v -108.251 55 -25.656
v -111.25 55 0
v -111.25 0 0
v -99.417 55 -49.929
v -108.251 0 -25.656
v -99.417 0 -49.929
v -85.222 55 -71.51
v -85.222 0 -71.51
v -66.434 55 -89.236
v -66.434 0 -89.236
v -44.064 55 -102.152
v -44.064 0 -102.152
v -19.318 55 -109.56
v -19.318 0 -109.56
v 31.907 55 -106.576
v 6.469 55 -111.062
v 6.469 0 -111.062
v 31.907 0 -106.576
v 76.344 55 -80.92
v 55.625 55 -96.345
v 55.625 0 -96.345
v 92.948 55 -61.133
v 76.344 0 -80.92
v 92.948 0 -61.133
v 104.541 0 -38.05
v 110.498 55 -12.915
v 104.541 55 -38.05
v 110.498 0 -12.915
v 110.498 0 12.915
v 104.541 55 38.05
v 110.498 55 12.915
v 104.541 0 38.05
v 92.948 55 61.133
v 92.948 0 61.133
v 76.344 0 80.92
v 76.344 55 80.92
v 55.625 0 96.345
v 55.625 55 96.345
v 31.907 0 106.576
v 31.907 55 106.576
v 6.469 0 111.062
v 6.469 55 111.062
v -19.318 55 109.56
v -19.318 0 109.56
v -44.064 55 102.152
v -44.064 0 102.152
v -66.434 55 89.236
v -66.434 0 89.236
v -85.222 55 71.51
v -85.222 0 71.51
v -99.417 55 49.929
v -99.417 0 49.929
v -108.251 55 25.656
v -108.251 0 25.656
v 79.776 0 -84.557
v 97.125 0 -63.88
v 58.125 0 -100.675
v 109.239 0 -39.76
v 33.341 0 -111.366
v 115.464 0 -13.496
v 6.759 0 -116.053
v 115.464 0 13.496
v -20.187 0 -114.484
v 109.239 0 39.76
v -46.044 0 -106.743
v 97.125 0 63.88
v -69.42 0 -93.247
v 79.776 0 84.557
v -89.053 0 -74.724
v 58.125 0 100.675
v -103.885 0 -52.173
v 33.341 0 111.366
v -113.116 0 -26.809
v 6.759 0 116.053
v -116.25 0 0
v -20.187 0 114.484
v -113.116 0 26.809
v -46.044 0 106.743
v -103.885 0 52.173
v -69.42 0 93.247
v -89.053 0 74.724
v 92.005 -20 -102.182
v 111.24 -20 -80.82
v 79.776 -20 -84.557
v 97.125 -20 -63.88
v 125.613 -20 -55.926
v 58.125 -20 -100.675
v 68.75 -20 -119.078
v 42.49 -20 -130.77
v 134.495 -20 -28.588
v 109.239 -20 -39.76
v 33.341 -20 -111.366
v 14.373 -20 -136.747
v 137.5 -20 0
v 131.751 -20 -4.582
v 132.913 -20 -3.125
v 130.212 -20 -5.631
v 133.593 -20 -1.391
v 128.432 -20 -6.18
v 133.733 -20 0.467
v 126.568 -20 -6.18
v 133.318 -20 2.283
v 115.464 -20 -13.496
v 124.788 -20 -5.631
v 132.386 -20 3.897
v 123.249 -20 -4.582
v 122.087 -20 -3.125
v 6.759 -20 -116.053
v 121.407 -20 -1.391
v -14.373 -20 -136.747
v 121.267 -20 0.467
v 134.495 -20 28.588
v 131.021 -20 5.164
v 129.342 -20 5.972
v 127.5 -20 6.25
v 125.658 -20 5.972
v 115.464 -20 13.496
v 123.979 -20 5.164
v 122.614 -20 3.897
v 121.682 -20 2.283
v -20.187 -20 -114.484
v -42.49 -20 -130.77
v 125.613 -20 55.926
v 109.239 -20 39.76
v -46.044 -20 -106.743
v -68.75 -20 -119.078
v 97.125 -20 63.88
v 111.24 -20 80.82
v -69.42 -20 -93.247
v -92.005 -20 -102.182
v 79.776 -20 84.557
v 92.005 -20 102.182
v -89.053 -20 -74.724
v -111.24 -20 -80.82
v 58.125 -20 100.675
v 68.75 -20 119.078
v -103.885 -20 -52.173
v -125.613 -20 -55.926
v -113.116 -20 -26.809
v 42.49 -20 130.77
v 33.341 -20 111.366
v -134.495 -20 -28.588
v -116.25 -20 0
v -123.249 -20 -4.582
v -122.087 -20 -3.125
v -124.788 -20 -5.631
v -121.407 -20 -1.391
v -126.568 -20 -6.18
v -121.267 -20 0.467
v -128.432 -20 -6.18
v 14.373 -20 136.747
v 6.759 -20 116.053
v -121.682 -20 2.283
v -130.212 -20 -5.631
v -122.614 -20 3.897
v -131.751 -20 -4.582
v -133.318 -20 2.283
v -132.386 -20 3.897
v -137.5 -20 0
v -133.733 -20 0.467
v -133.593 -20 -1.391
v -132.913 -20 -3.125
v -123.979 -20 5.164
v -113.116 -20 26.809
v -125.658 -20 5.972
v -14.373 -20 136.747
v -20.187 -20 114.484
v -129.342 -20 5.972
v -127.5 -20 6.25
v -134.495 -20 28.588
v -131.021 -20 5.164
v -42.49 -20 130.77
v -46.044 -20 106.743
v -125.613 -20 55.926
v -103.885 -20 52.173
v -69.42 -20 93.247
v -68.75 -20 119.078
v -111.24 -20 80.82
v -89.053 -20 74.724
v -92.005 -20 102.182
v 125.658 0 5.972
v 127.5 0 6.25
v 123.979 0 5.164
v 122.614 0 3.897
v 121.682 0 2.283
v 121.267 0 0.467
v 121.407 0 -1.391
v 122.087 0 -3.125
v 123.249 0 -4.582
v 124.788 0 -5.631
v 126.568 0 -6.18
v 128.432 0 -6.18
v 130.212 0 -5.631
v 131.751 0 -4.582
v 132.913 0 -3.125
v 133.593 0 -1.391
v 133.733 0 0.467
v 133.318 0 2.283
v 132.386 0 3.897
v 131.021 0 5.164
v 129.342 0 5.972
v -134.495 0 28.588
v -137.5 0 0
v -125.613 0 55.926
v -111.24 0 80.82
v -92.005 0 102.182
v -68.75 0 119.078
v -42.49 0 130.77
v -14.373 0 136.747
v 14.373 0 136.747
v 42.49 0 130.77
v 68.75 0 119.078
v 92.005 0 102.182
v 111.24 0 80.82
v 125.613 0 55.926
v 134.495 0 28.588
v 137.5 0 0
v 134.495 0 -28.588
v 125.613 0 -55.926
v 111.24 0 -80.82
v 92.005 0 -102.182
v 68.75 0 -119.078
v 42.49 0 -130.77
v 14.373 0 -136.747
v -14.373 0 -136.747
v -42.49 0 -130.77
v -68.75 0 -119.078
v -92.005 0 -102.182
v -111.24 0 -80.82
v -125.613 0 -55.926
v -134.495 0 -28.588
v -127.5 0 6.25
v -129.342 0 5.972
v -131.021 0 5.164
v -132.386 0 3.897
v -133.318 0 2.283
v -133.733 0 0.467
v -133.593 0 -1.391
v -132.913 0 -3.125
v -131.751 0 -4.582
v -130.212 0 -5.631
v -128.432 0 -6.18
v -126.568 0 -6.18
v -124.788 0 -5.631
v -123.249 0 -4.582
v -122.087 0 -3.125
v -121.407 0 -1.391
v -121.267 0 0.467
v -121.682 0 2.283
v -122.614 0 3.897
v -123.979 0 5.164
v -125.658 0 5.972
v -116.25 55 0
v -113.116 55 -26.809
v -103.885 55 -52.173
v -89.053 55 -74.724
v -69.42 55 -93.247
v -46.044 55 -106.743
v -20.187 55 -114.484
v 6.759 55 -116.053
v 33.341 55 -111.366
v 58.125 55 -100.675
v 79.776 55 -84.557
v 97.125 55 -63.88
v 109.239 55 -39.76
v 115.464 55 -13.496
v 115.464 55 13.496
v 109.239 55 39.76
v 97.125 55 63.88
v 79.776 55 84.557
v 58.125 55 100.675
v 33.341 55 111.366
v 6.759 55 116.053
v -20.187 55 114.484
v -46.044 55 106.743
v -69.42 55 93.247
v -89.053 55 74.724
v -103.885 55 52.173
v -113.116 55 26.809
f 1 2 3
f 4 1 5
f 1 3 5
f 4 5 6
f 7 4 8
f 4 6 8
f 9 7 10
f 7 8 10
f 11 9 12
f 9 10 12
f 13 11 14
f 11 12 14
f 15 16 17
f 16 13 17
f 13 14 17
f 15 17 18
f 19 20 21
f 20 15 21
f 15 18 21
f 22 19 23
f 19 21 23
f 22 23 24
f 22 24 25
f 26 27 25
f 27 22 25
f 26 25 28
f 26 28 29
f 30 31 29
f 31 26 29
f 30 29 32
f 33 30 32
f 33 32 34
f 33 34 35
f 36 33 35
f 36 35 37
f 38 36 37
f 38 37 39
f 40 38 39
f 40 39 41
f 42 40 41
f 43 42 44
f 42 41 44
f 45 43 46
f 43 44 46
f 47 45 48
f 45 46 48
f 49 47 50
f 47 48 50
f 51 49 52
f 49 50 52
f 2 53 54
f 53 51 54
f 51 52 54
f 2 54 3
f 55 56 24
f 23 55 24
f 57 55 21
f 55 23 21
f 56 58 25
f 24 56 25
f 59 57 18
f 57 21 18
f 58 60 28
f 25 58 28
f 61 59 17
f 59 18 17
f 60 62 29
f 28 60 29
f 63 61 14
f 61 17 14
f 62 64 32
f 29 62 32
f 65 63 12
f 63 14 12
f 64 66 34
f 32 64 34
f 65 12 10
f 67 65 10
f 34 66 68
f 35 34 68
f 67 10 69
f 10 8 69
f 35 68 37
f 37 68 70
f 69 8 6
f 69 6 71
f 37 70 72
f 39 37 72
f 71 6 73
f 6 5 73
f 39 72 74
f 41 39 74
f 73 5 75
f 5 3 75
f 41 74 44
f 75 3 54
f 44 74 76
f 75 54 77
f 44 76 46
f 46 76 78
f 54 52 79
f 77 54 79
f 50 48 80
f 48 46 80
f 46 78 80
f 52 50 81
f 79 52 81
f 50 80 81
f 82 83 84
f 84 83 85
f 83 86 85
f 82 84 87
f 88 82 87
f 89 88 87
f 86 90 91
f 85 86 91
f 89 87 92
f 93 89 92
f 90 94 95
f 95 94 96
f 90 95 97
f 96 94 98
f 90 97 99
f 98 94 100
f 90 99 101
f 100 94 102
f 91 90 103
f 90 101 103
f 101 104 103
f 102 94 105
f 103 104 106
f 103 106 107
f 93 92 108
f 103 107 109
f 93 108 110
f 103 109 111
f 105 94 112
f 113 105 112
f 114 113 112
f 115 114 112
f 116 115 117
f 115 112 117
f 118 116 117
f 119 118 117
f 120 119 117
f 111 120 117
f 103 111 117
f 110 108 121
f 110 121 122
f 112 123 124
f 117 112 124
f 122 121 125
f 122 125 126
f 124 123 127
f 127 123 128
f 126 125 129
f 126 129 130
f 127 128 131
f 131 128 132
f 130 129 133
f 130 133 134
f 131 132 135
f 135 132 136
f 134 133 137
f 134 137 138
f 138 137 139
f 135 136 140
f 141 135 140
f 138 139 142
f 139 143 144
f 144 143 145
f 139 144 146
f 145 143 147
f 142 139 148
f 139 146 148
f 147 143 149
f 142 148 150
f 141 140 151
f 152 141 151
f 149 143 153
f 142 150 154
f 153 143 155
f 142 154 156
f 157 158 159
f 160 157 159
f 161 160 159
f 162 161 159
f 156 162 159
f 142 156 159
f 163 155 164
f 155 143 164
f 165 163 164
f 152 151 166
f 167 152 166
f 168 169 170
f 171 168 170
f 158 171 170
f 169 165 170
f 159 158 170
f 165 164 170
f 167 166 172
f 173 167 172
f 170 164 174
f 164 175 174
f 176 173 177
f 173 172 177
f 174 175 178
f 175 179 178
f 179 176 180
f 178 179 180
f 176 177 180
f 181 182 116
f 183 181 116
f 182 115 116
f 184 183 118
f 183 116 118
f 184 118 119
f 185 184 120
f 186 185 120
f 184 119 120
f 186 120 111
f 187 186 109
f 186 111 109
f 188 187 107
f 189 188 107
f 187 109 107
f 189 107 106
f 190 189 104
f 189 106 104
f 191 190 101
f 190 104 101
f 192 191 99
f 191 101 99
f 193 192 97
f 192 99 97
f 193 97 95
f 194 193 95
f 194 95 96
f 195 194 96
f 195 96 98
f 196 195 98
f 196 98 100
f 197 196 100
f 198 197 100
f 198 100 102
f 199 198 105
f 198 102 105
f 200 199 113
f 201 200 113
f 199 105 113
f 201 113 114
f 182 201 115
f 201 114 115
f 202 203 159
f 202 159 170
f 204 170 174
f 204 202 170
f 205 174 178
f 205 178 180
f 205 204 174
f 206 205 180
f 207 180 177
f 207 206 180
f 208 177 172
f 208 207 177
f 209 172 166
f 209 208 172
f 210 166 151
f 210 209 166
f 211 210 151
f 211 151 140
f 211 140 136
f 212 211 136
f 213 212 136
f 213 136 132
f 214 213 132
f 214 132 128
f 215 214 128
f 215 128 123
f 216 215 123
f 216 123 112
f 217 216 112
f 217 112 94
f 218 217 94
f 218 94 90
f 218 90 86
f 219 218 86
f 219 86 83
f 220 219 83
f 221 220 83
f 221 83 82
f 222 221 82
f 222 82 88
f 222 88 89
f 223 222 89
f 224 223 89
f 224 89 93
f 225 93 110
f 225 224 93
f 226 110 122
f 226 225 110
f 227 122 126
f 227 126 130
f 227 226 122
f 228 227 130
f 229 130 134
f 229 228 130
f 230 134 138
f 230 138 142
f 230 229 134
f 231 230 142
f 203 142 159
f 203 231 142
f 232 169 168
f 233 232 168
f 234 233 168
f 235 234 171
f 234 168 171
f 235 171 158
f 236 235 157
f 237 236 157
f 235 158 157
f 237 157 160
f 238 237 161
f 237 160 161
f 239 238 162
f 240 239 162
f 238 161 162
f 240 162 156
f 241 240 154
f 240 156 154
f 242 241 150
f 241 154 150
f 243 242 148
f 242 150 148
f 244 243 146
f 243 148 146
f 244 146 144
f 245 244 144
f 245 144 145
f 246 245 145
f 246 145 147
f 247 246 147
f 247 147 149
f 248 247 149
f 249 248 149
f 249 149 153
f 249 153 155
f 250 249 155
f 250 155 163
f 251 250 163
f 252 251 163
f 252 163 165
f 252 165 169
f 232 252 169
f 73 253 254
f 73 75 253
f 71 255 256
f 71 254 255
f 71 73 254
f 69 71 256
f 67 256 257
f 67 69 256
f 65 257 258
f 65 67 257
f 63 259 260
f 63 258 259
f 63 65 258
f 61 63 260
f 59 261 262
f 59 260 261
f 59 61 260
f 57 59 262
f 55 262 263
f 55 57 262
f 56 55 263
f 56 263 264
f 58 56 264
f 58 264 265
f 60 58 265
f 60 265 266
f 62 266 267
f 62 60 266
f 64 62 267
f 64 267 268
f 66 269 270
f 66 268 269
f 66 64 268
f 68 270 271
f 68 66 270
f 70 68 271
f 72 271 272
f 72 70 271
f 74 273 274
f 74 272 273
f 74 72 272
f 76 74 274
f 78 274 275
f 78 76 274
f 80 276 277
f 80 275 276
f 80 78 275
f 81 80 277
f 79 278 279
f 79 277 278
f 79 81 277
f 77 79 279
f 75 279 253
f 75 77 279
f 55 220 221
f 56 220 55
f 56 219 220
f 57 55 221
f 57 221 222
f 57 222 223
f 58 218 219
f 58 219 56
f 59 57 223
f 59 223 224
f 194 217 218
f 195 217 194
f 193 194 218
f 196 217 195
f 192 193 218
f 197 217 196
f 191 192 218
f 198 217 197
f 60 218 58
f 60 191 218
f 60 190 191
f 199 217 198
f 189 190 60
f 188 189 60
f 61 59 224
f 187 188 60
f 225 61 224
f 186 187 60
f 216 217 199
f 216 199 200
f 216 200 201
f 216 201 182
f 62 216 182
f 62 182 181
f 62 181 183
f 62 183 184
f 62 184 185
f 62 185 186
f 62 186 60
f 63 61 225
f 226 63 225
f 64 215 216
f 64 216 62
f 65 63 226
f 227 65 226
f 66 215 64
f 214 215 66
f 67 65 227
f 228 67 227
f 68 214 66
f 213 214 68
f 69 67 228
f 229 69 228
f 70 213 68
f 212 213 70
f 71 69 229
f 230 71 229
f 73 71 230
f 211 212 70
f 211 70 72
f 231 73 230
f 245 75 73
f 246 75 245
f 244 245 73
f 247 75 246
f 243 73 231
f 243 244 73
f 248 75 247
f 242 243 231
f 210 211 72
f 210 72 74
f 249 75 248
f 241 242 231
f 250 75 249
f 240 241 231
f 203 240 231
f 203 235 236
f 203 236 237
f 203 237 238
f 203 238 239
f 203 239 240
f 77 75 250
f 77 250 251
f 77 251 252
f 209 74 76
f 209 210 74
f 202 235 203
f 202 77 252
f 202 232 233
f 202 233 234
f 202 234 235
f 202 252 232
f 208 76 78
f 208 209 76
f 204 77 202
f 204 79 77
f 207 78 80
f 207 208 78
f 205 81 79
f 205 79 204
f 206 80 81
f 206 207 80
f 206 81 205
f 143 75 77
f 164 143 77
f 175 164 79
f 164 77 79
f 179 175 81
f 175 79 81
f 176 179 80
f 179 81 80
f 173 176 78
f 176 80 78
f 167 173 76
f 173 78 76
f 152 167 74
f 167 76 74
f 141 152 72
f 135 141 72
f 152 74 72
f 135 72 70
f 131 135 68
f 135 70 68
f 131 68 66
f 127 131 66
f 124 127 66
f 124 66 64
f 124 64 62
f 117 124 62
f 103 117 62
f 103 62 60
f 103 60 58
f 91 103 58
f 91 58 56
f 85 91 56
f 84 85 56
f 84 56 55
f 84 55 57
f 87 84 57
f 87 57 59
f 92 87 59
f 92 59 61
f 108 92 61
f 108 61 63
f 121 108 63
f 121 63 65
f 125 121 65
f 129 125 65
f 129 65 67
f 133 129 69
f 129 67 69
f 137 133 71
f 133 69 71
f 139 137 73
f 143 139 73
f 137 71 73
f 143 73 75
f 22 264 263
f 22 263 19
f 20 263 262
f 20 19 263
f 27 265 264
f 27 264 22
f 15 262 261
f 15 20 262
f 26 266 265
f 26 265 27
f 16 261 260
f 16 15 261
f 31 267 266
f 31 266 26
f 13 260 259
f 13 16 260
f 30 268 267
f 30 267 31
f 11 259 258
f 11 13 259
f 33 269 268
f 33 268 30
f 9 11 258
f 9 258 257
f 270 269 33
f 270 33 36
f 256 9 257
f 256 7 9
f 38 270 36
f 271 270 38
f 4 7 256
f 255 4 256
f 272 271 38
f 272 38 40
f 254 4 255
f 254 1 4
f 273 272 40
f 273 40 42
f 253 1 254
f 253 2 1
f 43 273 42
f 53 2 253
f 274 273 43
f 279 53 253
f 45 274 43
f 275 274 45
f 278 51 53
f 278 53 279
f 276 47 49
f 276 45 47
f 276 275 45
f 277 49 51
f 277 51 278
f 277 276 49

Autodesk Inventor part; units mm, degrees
ref_plane "YZ Plane" through (0, 0, 0) normal (1, 0, 0) x (0, 1, 0)
ref_plane "XZ Plane" through (0, 0, 0) normal (0, 1, 0) x (-1, 0, 0)
ref_plane "XY Plane" through (0, 0, 0) normal (0, 0, 1) x (1, 0, 0)
sketch "Skizze1" plane through (0, 0, 0) normal (0, 1, 0) x (-1, 0, 0)
  circle A0 centre (0, 0) radius 137.5
  circle A1 centre (0, 0) radius 116.25
  circle A2 centre (0, 0) radius 111.25
  dimension "d0" = 275
  dimension "d1" = 232.5
  dimension "d2" = 222.5
extrude "Extrusion1" add sketch "Skizze1" against normal blind 20 contours A0
extrude "Extrusion2" add sketch "Skizze1" along normal blind 55 contours A1
sketch "Skizze2" plane through (0, 0, 0) normal (0, 1, 0) x (1, 0, 0)
  point P0 (0, 0)
  point P1 (-127.5, 0)
  point P2 (127.5, 0)
  dimension "d14" = 127.5
  dimension "d15" = 127.5
hole "Bohrung1" at (-127.5, 0, 0) at (127.5, 0, 0) direction (0, -1, 0) diameter 12.5 depth 20
properties part number "4" material "Stahl, Kohlenstoff"
